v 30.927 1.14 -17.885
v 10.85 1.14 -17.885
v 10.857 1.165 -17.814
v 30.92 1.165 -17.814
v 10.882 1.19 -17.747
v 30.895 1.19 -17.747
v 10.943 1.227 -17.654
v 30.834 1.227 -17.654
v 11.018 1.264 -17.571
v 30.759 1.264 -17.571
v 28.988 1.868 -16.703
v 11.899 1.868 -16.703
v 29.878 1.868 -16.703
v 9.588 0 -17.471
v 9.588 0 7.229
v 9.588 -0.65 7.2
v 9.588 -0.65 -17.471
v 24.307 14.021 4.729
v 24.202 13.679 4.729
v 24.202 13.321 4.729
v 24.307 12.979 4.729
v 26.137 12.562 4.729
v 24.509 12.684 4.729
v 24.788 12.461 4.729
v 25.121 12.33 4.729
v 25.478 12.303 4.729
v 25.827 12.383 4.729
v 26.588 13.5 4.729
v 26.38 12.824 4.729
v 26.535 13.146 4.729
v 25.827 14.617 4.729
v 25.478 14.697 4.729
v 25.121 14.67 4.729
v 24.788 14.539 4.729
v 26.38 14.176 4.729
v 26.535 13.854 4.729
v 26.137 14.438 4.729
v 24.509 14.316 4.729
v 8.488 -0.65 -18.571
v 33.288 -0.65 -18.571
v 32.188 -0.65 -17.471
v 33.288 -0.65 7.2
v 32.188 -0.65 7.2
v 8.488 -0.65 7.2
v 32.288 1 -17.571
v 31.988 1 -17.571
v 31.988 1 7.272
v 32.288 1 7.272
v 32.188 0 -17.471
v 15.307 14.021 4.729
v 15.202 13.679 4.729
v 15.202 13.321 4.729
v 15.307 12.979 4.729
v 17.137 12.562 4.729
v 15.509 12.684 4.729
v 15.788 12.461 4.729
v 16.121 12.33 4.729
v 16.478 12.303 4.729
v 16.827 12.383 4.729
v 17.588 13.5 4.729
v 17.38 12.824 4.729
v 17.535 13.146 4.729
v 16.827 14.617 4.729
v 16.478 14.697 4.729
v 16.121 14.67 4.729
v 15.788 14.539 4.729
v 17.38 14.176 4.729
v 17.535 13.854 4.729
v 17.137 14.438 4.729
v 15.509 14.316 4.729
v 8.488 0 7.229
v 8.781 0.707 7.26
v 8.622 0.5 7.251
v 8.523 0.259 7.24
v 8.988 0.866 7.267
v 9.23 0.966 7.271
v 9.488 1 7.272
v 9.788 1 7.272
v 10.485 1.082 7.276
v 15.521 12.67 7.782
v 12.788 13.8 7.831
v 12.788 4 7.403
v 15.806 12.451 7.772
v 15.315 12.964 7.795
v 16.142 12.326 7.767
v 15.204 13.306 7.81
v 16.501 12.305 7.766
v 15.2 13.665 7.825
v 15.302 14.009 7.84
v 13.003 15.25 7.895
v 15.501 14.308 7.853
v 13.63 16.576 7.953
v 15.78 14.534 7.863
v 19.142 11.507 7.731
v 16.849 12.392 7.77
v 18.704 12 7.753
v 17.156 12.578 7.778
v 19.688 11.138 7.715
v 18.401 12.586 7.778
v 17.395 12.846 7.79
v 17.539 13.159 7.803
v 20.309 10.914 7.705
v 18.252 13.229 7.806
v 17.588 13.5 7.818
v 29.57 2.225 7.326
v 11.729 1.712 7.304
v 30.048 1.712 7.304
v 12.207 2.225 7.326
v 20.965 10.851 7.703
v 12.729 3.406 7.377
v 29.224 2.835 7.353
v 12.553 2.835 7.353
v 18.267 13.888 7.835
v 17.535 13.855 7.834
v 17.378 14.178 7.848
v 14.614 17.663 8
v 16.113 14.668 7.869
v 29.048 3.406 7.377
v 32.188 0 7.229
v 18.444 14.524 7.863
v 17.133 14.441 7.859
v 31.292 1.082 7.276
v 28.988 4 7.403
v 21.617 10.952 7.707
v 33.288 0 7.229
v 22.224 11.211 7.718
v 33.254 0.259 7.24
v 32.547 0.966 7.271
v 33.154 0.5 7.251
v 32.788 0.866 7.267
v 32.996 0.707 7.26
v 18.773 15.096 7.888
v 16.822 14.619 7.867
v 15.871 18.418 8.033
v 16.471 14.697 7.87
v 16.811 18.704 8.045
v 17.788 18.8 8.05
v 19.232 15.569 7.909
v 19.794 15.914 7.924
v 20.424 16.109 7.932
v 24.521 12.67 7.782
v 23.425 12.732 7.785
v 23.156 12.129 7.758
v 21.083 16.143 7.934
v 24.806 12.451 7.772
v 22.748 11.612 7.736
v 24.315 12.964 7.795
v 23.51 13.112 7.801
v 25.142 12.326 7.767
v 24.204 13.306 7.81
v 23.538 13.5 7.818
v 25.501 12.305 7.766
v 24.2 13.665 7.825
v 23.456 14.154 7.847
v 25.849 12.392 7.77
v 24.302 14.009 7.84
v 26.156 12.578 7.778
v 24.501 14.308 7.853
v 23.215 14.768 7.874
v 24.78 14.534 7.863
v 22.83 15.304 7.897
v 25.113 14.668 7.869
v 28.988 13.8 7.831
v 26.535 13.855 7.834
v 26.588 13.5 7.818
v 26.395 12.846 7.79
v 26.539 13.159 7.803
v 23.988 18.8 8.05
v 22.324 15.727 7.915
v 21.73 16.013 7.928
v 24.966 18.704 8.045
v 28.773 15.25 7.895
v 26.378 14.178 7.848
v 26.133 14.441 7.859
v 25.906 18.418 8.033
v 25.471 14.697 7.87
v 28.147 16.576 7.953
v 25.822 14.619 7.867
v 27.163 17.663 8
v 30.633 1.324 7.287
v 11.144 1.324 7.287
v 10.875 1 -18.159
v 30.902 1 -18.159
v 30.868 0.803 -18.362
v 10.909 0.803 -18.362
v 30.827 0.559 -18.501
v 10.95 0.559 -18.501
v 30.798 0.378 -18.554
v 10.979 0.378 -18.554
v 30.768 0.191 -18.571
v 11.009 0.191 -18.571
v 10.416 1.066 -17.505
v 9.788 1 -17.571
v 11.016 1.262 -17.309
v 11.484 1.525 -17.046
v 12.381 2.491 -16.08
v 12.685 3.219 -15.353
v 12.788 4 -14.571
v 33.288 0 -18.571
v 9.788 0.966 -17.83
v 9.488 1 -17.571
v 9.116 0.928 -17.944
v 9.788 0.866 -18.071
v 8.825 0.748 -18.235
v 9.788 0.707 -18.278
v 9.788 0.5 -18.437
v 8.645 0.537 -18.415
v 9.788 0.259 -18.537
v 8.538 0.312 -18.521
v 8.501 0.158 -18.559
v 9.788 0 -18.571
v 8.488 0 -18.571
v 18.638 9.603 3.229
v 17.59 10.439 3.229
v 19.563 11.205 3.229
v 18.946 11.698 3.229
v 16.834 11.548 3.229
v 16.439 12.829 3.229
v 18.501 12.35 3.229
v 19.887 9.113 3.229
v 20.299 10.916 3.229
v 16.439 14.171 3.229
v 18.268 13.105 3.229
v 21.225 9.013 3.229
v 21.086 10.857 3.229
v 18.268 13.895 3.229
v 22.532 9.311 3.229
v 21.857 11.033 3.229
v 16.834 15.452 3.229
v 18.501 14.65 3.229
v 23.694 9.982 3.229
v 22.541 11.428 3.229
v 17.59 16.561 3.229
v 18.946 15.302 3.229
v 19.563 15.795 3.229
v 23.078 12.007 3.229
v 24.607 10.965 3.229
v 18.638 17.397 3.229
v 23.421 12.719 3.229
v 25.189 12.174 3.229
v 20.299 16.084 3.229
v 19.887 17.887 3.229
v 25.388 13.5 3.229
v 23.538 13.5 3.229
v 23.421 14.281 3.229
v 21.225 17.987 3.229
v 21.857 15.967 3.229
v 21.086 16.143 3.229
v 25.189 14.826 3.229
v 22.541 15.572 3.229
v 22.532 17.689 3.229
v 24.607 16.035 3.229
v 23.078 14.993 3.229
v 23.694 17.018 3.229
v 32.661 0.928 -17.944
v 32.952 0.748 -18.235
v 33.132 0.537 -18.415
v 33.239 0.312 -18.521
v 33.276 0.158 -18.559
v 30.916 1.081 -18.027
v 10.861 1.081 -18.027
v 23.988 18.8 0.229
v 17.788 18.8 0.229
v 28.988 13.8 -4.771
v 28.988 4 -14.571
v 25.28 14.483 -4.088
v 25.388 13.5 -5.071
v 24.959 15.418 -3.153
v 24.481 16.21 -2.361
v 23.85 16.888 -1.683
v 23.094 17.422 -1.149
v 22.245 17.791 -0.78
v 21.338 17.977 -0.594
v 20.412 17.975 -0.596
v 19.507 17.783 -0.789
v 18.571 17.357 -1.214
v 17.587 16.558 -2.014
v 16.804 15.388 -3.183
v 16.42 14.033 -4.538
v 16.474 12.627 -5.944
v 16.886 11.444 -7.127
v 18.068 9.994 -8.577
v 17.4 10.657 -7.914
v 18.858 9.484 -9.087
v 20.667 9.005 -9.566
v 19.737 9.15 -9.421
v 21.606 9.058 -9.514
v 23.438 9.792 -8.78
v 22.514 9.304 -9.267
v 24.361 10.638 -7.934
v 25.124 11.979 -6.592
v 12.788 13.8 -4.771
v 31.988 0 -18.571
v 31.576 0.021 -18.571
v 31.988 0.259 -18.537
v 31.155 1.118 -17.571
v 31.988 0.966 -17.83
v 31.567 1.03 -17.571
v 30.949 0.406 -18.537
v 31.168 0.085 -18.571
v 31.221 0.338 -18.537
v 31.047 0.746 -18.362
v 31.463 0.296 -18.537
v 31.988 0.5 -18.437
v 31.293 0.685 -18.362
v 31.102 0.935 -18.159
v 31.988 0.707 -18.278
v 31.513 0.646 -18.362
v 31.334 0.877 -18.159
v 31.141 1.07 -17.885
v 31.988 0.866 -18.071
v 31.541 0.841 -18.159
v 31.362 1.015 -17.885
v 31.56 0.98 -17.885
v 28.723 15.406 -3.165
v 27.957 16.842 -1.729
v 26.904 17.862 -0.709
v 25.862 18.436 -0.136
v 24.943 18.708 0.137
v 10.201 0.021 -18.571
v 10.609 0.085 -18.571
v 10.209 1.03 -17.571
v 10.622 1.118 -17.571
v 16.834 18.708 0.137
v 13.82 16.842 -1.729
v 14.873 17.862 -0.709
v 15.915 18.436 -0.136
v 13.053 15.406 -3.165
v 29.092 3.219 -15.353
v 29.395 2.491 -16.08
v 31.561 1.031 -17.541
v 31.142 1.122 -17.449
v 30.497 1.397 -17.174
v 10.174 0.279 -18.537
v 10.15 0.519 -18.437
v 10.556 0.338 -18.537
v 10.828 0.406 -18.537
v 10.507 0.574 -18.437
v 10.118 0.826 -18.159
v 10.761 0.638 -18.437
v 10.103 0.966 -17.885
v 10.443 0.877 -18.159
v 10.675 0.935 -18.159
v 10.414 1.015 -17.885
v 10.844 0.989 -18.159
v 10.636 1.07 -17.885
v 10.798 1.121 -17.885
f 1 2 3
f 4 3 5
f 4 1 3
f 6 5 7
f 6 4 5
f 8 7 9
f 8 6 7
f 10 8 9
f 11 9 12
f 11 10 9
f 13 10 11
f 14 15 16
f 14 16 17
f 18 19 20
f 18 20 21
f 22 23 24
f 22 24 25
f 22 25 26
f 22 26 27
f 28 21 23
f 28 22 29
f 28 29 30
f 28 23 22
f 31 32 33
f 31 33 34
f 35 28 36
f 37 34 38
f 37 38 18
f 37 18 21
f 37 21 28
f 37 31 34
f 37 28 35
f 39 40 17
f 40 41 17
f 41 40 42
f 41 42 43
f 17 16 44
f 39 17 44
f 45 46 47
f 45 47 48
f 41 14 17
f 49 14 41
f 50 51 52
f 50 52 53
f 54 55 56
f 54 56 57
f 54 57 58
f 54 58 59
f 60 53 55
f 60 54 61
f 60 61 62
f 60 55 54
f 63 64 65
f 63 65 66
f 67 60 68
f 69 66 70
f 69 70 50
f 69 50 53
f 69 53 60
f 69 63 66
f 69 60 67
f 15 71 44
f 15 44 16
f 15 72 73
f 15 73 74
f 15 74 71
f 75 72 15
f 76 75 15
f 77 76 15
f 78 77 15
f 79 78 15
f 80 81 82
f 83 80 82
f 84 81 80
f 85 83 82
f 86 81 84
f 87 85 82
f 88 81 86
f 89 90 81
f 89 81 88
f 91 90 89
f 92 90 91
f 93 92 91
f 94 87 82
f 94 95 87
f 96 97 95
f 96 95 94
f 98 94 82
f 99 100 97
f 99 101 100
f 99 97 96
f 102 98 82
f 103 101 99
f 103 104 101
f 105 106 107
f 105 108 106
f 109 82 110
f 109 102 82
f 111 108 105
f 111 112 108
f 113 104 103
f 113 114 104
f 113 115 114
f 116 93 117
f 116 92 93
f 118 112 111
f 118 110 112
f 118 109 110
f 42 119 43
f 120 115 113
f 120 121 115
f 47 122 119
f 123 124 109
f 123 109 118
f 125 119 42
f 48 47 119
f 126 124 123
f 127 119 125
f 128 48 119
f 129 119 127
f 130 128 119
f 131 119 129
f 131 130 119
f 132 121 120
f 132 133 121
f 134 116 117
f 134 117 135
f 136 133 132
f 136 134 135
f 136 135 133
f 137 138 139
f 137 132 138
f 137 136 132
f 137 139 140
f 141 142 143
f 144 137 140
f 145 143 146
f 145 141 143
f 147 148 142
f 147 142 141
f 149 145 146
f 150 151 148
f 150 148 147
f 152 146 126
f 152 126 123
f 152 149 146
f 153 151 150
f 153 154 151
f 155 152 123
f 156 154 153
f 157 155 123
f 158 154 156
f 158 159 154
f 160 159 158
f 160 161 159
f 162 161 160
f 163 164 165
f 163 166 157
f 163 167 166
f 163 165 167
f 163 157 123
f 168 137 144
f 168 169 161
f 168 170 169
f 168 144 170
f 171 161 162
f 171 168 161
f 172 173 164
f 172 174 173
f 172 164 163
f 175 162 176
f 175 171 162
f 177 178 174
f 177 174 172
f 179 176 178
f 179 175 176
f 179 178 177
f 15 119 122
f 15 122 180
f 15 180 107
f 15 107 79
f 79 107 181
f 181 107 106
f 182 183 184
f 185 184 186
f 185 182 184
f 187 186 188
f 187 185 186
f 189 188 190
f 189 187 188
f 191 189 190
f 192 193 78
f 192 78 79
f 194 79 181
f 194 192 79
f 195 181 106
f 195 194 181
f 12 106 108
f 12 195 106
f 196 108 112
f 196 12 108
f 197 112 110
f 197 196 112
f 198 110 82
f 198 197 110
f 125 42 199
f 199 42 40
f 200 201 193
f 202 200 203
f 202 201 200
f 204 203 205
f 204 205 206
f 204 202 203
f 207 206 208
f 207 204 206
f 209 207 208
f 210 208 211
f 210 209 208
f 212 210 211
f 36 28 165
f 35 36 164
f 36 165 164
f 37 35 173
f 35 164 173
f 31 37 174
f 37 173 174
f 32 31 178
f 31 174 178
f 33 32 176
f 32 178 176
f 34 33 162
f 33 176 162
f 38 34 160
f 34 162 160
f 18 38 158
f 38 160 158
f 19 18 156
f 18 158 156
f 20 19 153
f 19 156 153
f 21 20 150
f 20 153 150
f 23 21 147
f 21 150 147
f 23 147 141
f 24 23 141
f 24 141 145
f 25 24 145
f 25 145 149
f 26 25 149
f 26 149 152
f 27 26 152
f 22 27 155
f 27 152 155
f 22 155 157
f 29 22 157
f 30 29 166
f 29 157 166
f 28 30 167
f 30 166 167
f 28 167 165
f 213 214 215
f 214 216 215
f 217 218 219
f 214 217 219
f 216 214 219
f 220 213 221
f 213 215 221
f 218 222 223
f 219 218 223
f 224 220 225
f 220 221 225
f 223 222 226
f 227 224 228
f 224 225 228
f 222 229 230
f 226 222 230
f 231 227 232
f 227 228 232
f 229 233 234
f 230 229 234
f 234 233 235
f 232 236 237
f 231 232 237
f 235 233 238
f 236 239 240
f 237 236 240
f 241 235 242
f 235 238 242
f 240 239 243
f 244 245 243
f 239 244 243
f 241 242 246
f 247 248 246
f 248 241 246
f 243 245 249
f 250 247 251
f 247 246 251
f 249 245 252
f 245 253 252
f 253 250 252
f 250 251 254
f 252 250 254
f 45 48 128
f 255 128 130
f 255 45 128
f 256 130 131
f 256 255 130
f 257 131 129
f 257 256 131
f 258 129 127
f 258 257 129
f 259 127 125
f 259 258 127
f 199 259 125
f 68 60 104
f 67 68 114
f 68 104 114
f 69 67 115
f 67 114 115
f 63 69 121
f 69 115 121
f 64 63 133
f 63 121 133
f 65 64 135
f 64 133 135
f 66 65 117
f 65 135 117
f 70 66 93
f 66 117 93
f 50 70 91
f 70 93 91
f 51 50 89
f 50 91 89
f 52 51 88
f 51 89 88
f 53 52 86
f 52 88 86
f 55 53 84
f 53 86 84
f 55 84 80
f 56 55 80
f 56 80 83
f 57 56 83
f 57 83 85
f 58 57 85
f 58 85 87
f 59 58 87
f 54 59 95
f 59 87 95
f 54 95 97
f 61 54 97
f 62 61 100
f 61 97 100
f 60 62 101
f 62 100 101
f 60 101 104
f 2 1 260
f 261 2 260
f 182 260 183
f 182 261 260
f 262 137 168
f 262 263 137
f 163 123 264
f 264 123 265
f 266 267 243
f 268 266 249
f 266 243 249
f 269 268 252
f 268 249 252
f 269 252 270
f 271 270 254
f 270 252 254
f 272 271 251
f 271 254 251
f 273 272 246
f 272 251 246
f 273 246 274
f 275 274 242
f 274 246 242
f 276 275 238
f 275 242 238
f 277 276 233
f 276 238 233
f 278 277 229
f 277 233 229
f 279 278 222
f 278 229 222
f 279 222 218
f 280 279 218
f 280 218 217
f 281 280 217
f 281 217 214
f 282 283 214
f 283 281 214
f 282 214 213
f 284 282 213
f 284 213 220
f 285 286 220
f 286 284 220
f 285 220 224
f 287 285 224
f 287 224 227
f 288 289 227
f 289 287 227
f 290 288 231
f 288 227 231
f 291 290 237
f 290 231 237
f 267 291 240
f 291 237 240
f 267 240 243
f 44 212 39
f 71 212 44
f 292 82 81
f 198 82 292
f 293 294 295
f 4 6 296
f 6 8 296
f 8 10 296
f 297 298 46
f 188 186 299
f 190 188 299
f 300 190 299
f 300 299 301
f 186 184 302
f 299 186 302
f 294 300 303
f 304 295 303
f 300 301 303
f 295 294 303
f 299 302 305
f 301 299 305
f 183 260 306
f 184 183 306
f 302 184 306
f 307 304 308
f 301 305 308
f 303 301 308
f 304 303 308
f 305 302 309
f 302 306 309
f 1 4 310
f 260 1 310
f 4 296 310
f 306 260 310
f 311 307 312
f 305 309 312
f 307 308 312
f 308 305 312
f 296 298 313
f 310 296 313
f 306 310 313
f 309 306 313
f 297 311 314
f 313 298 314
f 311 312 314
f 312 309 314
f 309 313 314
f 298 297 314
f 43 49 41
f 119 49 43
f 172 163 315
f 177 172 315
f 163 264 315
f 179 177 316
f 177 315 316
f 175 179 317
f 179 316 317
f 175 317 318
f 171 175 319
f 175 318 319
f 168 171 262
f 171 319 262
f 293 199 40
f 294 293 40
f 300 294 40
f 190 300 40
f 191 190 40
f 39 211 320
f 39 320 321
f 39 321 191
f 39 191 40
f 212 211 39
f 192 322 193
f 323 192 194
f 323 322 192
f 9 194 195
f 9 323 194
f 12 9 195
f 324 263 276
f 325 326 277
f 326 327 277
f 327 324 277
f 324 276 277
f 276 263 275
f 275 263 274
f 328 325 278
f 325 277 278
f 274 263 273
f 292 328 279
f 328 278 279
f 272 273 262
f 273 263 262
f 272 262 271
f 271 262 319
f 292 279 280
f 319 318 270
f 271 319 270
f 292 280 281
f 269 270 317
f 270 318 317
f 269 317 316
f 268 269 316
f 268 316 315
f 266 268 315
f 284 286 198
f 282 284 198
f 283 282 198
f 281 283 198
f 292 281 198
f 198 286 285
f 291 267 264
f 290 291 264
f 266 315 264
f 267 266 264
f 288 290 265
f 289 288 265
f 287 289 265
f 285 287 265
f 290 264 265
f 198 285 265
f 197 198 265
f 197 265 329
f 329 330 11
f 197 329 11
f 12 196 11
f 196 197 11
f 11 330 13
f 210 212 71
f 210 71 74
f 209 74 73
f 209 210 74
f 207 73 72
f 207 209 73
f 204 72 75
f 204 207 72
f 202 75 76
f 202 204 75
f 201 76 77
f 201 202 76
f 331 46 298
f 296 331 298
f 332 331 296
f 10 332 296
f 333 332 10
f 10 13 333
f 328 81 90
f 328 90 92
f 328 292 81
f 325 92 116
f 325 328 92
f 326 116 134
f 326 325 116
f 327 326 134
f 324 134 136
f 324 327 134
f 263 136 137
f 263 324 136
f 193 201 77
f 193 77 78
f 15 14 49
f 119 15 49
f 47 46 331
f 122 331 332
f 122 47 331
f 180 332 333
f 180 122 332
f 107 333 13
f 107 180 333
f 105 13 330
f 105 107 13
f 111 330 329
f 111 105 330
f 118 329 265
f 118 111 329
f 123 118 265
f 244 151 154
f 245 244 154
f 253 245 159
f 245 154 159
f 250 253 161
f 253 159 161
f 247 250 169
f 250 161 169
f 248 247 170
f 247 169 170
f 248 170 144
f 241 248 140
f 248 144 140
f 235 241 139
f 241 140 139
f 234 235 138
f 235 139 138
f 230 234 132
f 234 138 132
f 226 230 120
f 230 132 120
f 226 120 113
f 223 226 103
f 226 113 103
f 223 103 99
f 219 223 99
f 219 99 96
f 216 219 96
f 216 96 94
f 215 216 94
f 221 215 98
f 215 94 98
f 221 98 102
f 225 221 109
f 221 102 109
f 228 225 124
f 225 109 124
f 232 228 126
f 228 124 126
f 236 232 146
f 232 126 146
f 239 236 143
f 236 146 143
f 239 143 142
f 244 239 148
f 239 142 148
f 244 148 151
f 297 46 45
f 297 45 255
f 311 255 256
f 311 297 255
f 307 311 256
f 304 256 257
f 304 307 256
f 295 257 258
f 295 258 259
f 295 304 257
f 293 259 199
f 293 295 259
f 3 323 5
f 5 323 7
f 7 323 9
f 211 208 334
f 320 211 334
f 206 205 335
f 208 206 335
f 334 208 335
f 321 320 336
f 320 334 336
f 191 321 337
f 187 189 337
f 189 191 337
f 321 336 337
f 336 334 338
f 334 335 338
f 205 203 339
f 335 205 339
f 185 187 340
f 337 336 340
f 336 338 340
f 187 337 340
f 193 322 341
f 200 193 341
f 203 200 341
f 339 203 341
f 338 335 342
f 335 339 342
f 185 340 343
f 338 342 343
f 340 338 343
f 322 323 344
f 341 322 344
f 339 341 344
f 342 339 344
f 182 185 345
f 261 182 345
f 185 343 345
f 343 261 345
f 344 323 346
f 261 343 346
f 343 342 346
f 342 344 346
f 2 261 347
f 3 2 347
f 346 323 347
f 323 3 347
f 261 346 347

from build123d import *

# Parameters (mm, degrees)
SKETCH1_W             = 24.8
SKETCH1_H             = 25.8
BOSS_EXTRUDE1_DEPTH   = 1
SKETCH3_W             = 16.2
SKETCH3_H             = 7
BOSS_EXTRUDE3_DEPTH   = 17.8
DRAFT2_ANGLE          = 45
TOP_FILLET_R          = 5
SKETCH4_R             = 2.65
HOLE_BOLT_DEPTH       = 4
SKETCH5_R             = 4.5
HOLE_BOLT_CAP_DEPTH   = 20
SKETCH6_R             = 1.2
HOLES_DOWEL_PIN_DEPTH = 2.5
BASE_FILLET_R         = 3
BRIM_DEPTH            = 0.65
INWARD_SLANT_ANGLE    = 2.5
FILLET1_START         = 8.48845
FILLET1_2_DEPTH       = 24.8
FILLET1_3_DEPTH       = 1.3
FILLET1_START_2       = 31.98845
FILLET1_4_DEPTH       = 1.3
FILLET1_START_3       = -20
FILLET1_5_DEPTH       = 28


with BuildPart() as part:
    # Sketch1 → Boss-Extrude1 (new body)
    with BuildSketch(Plane(origin=(0, 0, 0), x_dir=(1, 0, 0), z_dir=(0, 1, 0))):
        with Locations((20.88845, 5.671213532)):
            Rectangle(SKETCH1_W, SKETCH1_H)
    extrude(amount=BOSS_EXTRUDE1_DEPTH)

    # Sketch3 → Boss-Extrude3 (add)
    with BuildSketch(Plane(origin=(0, 1, 0), x_dir=(1, 0, 0), z_dir=(0, 1, 0))):
        with Locations((20.88845, -3.728786468)):
            Rectangle(SKETCH3_W, SKETCH3_H)
    extrude(amount=BOSS_EXTRUDE3_DEPTH)

    # Draft2
    draft2_faces = [part.faces().sort_by_distance(p)[0] for p in [
        (20.88845, 9.9, 0.228786468),
    ]]
    draft(draft2_faces, Plane.ZX.offset(18.8), DRAFT2_ANGLE)

    # top_fillet
    top_fillet_edges = [part.edges().sort_by_distance(p)[0] for p in [
        (12.78845, 18.8, 3.728786468),
        (28.98845, 18.8, 3.728786468),
    ]]
    fillet(top_fillet_edges, radius=TOP_FILLET_R)

    # Sketch4 → hole_bolt (cut)
    with BuildSketch(Plane.XY.offset(7.228786468)):
        with Locations((20.88845, 13.5)):
            Circle(SKETCH4_R)
    extrude(amount=-HOLE_BOLT_DEPTH, mode=Mode.SUBTRACT)

    # Sketch5 → hole_bolt_cap (cut)
    with BuildSketch(Plane.XY.offset(3.228786468)):
        with Locations((20.88845, 13.5)):
            Circle(SKETCH5_R)
    extrude(amount=-HOLE_BOLT_CAP_DEPTH, mode=Mode.SUBTRACT)

    # Sketch6 → holes_dowel_pin (cut)
    with BuildSketch(Plane.XY.offset(7.228786468)):
        with Locations((25.38845, 13.5)):
            Circle(SKETCH6_R)
        with Locations((16.38845, 13.5)):
            Circle(SKETCH6_R)
    extrude(amount=-HOLES_DOWEL_PIN_DEPTH, mode=Mode.SUBTRACT)

    # base_fillet
    # the kernel refuses this fillet: 3 mm, written as the material it adds along each edge
    with BuildSketch(Plane(origin=(12.78845, 1, -25.071213532), x_dir=(-1, 0, 0), z_dir=(0, 0, 1))) as base_fillet_piece_1_section:
        with BuildLine():
            CenterArc((BASE_FILLET_R, -BASE_FILLET_R), BASE_FILLET_R, 90, 90)
            Line((0, -BASE_FILLET_R), (0, 0))
            Line((0, 0), (BASE_FILLET_R, 0))
        make_face()
    base_fillet_piece_1 = extrude(amount=32.3, mode=Mode.PRIVATE)
    base_fillet_piece_1 = split(base_fillet_piece_1, bisect_by=Plane(origin=(12.78845, -2.75, -21.321213532), z_dir=(0, -0.7071067811865488, 0.7071067811865462)), keep=Keep.TOP, mode=Mode.PRIVATE)
    add(base_fillet_piece_1)
    with BuildSketch(Plane(origin=(28.98845, 1, 7.228786468), x_dir=(0, 1, 0), z_dir=(0, 0, -1))) as base_fillet_piece_2_section:
        with BuildLine():
            CenterArc((BASE_FILLET_R, BASE_FILLET_R), BASE_FILLET_R, 180, 90)
            Line((0, BASE_FILLET_R), (0, 0))
            Line((0, 0), (BASE_FILLET_R, 0))
        make_face()
    base_fillet_piece_2 = extrude(amount=32.3, mode=Mode.PRIVATE)
    base_fillet_piece_2 = split(base_fillet_piece_2, bisect_by=Plane(origin=(28.98845, 13.4, -5.171213532), z_dir=(0, -0.7071067811865488, 0.7071067811865462)), keep=Keep.TOP, mode=Mode.PRIVATE)
    add(base_fillet_piece_2)
    with BuildSketch(Plane(origin=(28.98845, 1, -17.571213532), x_dir=(0, 0, -1), z_dir=(-1, 0, 0))) as base_fillet_piece_3:
        with BuildLine():
            CenterArc((1.25335823, -2.989282457), BASE_FILLET_R, 94.844556223, 40.155443777)
            Line((-0.867962113, -0.867962113), (0, 0))
            Line((0, 0), (1, 0))
        make_face()
    extrude(amount=16.2)
    with BuildSketch(Plane(origin=(12.78845, 1, -25.071213532), x_dir=(-1, 0, 0), z_dir=(0, 0, 1))) as base_fillet_piece_4a_section:
        with BuildLine():
            CenterArc((BASE_FILLET_R, -BASE_FILLET_R), BASE_FILLET_R, 90, 90)
            Line((0, -BASE_FILLET_R), (0, 0))
            Line((0, 0), (BASE_FILLET_R, 0))
        make_face()
    base_fillet_piece_4a = extrude(amount=32.3, mode=Mode.PRIVATE)
    base_fillet_piece_4a = split(base_fillet_piece_4a, bisect_by=Plane(origin=(12.78845, -2.75, -21.321213532), z_dir=(0, 0.7071067811865488, -0.7071067811865462)), keep=Keep.TOP, mode=Mode.PRIVATE)
    base_fillet_piece_4a = split(base_fillet_piece_4a, bisect_by=Plane(origin=(12.78845, 1, -18.571213532), z_dir=(0, 0, 1)), keep=Keep.TOP, mode=Mode.PRIVATE)
    with BuildSketch(Plane(origin=(28.98845, 1, -17.571213532), x_dir=(0, 0, -1), z_dir=(-1, 0, 0))) as base_fillet_piece_4b_section:
        with BuildLine():
            CenterArc((1.25335823, -2.989282457), BASE_FILLET_R, 94.844556223, 40.155443777)
            Line((-0.867962113, -0.867962113), (0, 0))
            Line((0, 0), (1, 0))
        make_face()
    base_fillet_piece_4b = extrude(amount=19.268709481, mode=Mode.PRIVATE)
    base_fillet_piece_4b = split(base_fillet_piece_4b, bisect_by=Plane(origin=(12.78845, 1, -17.571213532), z_dir=(-1, 0, 0)), keep=Keep.TOP, mode=Mode.PRIVATE)
    base_fillet_piece_4 = base_fillet_piece_4a & base_fillet_piece_4b
    add(base_fillet_piece_4)
    with BuildSketch(Plane(origin=(28.98845, 1, 7.228786468), x_dir=(0, 1, 0), z_dir=(0, 0, -1))) as base_fillet_piece_5a_section:
        with BuildLine():
            CenterArc((BASE_FILLET_R, BASE_FILLET_R), BASE_FILLET_R, 180, 90)
            Line((0, BASE_FILLET_R), (0, 0))
            Line((0, 0), (BASE_FILLET_R, 0))
        make_face()
    base_fillet_piece_5a = extrude(amount=32.3, mode=Mode.PRIVATE)
    base_fillet_piece_5a = split(base_fillet_piece_5a, bisect_by=Plane(origin=(28.98845, 13.4, -5.171213532), z_dir=(0, 0.7071067811865488, -0.7071067811865462)), keep=Keep.TOP, mode=Mode.PRIVATE)
    base_fillet_piece_5a = split(base_fillet_piece_5a, bisect_by=Plane(origin=(28.98845, 1, -18.571213532), z_dir=(0, 0, 1)), keep=Keep.TOP, mode=Mode.PRIVATE)
    with BuildSketch(Plane(origin=(32.057159481, 1, -17.571213532), x_dir=(0, 0, -1), z_dir=(-1, 0, 0))) as base_fillet_piece_5b_section:
        with BuildLine():
            CenterArc((1.25335823, -2.989282457), BASE_FILLET_R, 94.844556223, 40.155443777)
            Line((-0.867962113, -0.867962113), (0, 0))
            Line((0, 0), (1, 0))
        make_face()
    base_fillet_piece_5b = extrude(amount=19.268709481, mode=Mode.PRIVATE)
    base_fillet_piece_5b = split(base_fillet_piece_5b, bisect_by=Plane(origin=(28.98845, 1, -17.571213532), z_dir=(1, 0, 0)), keep=Keep.TOP, mode=Mode.PRIVATE)
    base_fillet_piece_5 = base_fillet_piece_5a & base_fillet_piece_5b
    add(base_fillet_piece_5)

    # Sketch8 → brim (add)
    with BuildSketch(Plane.XZ):
        Polygon((8.48845, 7.228786468), (9.58845, 7.228786468), (9.58845, -17.471213532), (32.18845, -17.471213532), (32.18845, 7.228786468), (33.28845, 7.228786468), (33.28845, -18.571213532), (8.48845, -18.571213532), align=None)
    extrude(amount=BRIM_DEPTH)

    # inward_slant
    inward_slant_faces = [part.faces().sort_by_distance(p)[0] for p in [
        (20.88845, 8.182651501, 7.228786468),
    ]]
    draft(inward_slant_faces, Plane(origin=(0, 0, 0), x_dir=(0, 0, -1), z_dir=(0, -1, 0)), INWARD_SLANT_ANGLE)

    # Fillet1: read off the stored shape, not the designer's step
    # Fillet1 outline → Fillet1 (revolve, cut)
    with BuildSketch(Plane(origin=(9.78845, 4, 0), x_dir=(1, 0, 0), z_dir=(0, -1, 0))):
        with BuildLine():
            ThreePointArc((4, -18.571213532), (3.292893219, -18.278320313), (3, -17.571213532))
            Line((3, -17.571213532), (3, -18.571213532))
            Line((3, -18.571213532), (4, -18.571213532))
        make_face()
    revolve(axis=Axis((9.78845, 4, 0), (0, 0, 1)), mode=Mode.SUBTRACT)

    # Fillet1 2 outline → Fillet1 2 (cut)
    with BuildSketch(Plane.YZ.offset(FILLET1_START)):
        with BuildLine():
            Line((1, -18.254186707), (1, -18.158633642))
            ThreePointArc((1, -18.158633642), (0.644909369, -18.462117598), (0.19071784, -18.571213532))
            Line((0.19071784, -18.571213532), (1, -18.571213532))
            Line((1, -18.571213532), (1, -18.254186707))
        make_face()
        with BuildLine():
            ThreePointArc((1.140358994, -17.884553089), (1.080792468, -18.027028359), (1, -18.158633642))
            Line((1, -18.158633642), (1, -18.254186707))
            Line((1, -18.254186707), (0.999995093, -18.571271439))
            ThreePointArc((0.999995093, -18.571271439), (1.050052637, -18.223798874), (1.140358994, -17.884553089))
        make_face()
    extrude(amount=FILLET1_2_DEPTH, mode=Mode.SUBTRACT)

    # Fillet1 3 outline → Fillet1 3 (cut)
    with BuildSketch(Plane.YZ.offset(FILLET1_START)):
        with BuildLine():
            Line((1, -18.158633642), (1, -17.571213532))
            ThreePointArc((1, -17.571213532), (0.707106781, -18.278320313), (0, -18.571213532))
            Line((0, -18.571213532), (0.19071784, -18.571213532))
            ThreePointArc((0.19071784, -18.571213532), (0.644909369, -18.462117598), (1, -18.158633642))
        make_face()
    extrude(amount=FILLET1_3_DEPTH, mode=Mode.SUBTRACT)

    # Fillet1 4 outline → Fillet1 4 (cut)
    with BuildSketch(Plane.YZ.offset(FILLET1_START_2)):
        with BuildLine():
            Line((1, -18.158633642), (1, -17.571213532))
            ThreePointArc((1, -17.571213532), (0.707106781, -18.278320313), (0, -18.571213532))
            Line((0, -18.571213532), (0.19071784, -18.571213532))
            ThreePointArc((0.19071784, -18.571213532), (0.644909369, -18.462117598), (1, -18.158633642))
        make_face()
    extrude(amount=FILLET1_4_DEPTH, mode=Mode.SUBTRACT)

    # Fillet1 5 outline → Fillet1 5 (cut)
    with BuildSketch(Plane.XY.offset(FILLET1_START_3)):
        with BuildLine():
            ThreePointArc((8.48845, 0), (8.781343219, 0.707106781), (9.48845, 1))
            Line((9.48845, 1), (8.48845, 1))
            Line((8.48845, 1), (8.48845, 0))
        make_face()
        with BuildLine():
            Line((33.28845, 1), (32.28845, 1))
            ThreePointArc((32.28845, 1), (32.995556781, 0.707106781), (33.28845, 0))
            Line((33.28845, 0), (33.28845, 1))
        make_face()
    extrude(amount=FILLET1_5_DEPTH, mode=Mode.SUBTRACT)

    # Fillet1 6 outline → Fillet1 6 (revolve, cut)
    with BuildSketch(Plane(origin=(31.98845, 4, 0), x_dir=(1, 0, 0), z_dir=(0, -1, 0))):
        with BuildLine():
            ThreePointArc((4, -18.571213532), (3.292893219, -18.278320313), (3, -17.571213532))
            Line((3, -17.571213532), (3, -18.571213532))
            Line((3, -18.571213532), (4, -18.571213532))
        make_face()
    revolve(axis=Axis((31.98845, 4, 0), (0, 0, 1)), mode=Mode.SUBTRACT)


solid = part.part
